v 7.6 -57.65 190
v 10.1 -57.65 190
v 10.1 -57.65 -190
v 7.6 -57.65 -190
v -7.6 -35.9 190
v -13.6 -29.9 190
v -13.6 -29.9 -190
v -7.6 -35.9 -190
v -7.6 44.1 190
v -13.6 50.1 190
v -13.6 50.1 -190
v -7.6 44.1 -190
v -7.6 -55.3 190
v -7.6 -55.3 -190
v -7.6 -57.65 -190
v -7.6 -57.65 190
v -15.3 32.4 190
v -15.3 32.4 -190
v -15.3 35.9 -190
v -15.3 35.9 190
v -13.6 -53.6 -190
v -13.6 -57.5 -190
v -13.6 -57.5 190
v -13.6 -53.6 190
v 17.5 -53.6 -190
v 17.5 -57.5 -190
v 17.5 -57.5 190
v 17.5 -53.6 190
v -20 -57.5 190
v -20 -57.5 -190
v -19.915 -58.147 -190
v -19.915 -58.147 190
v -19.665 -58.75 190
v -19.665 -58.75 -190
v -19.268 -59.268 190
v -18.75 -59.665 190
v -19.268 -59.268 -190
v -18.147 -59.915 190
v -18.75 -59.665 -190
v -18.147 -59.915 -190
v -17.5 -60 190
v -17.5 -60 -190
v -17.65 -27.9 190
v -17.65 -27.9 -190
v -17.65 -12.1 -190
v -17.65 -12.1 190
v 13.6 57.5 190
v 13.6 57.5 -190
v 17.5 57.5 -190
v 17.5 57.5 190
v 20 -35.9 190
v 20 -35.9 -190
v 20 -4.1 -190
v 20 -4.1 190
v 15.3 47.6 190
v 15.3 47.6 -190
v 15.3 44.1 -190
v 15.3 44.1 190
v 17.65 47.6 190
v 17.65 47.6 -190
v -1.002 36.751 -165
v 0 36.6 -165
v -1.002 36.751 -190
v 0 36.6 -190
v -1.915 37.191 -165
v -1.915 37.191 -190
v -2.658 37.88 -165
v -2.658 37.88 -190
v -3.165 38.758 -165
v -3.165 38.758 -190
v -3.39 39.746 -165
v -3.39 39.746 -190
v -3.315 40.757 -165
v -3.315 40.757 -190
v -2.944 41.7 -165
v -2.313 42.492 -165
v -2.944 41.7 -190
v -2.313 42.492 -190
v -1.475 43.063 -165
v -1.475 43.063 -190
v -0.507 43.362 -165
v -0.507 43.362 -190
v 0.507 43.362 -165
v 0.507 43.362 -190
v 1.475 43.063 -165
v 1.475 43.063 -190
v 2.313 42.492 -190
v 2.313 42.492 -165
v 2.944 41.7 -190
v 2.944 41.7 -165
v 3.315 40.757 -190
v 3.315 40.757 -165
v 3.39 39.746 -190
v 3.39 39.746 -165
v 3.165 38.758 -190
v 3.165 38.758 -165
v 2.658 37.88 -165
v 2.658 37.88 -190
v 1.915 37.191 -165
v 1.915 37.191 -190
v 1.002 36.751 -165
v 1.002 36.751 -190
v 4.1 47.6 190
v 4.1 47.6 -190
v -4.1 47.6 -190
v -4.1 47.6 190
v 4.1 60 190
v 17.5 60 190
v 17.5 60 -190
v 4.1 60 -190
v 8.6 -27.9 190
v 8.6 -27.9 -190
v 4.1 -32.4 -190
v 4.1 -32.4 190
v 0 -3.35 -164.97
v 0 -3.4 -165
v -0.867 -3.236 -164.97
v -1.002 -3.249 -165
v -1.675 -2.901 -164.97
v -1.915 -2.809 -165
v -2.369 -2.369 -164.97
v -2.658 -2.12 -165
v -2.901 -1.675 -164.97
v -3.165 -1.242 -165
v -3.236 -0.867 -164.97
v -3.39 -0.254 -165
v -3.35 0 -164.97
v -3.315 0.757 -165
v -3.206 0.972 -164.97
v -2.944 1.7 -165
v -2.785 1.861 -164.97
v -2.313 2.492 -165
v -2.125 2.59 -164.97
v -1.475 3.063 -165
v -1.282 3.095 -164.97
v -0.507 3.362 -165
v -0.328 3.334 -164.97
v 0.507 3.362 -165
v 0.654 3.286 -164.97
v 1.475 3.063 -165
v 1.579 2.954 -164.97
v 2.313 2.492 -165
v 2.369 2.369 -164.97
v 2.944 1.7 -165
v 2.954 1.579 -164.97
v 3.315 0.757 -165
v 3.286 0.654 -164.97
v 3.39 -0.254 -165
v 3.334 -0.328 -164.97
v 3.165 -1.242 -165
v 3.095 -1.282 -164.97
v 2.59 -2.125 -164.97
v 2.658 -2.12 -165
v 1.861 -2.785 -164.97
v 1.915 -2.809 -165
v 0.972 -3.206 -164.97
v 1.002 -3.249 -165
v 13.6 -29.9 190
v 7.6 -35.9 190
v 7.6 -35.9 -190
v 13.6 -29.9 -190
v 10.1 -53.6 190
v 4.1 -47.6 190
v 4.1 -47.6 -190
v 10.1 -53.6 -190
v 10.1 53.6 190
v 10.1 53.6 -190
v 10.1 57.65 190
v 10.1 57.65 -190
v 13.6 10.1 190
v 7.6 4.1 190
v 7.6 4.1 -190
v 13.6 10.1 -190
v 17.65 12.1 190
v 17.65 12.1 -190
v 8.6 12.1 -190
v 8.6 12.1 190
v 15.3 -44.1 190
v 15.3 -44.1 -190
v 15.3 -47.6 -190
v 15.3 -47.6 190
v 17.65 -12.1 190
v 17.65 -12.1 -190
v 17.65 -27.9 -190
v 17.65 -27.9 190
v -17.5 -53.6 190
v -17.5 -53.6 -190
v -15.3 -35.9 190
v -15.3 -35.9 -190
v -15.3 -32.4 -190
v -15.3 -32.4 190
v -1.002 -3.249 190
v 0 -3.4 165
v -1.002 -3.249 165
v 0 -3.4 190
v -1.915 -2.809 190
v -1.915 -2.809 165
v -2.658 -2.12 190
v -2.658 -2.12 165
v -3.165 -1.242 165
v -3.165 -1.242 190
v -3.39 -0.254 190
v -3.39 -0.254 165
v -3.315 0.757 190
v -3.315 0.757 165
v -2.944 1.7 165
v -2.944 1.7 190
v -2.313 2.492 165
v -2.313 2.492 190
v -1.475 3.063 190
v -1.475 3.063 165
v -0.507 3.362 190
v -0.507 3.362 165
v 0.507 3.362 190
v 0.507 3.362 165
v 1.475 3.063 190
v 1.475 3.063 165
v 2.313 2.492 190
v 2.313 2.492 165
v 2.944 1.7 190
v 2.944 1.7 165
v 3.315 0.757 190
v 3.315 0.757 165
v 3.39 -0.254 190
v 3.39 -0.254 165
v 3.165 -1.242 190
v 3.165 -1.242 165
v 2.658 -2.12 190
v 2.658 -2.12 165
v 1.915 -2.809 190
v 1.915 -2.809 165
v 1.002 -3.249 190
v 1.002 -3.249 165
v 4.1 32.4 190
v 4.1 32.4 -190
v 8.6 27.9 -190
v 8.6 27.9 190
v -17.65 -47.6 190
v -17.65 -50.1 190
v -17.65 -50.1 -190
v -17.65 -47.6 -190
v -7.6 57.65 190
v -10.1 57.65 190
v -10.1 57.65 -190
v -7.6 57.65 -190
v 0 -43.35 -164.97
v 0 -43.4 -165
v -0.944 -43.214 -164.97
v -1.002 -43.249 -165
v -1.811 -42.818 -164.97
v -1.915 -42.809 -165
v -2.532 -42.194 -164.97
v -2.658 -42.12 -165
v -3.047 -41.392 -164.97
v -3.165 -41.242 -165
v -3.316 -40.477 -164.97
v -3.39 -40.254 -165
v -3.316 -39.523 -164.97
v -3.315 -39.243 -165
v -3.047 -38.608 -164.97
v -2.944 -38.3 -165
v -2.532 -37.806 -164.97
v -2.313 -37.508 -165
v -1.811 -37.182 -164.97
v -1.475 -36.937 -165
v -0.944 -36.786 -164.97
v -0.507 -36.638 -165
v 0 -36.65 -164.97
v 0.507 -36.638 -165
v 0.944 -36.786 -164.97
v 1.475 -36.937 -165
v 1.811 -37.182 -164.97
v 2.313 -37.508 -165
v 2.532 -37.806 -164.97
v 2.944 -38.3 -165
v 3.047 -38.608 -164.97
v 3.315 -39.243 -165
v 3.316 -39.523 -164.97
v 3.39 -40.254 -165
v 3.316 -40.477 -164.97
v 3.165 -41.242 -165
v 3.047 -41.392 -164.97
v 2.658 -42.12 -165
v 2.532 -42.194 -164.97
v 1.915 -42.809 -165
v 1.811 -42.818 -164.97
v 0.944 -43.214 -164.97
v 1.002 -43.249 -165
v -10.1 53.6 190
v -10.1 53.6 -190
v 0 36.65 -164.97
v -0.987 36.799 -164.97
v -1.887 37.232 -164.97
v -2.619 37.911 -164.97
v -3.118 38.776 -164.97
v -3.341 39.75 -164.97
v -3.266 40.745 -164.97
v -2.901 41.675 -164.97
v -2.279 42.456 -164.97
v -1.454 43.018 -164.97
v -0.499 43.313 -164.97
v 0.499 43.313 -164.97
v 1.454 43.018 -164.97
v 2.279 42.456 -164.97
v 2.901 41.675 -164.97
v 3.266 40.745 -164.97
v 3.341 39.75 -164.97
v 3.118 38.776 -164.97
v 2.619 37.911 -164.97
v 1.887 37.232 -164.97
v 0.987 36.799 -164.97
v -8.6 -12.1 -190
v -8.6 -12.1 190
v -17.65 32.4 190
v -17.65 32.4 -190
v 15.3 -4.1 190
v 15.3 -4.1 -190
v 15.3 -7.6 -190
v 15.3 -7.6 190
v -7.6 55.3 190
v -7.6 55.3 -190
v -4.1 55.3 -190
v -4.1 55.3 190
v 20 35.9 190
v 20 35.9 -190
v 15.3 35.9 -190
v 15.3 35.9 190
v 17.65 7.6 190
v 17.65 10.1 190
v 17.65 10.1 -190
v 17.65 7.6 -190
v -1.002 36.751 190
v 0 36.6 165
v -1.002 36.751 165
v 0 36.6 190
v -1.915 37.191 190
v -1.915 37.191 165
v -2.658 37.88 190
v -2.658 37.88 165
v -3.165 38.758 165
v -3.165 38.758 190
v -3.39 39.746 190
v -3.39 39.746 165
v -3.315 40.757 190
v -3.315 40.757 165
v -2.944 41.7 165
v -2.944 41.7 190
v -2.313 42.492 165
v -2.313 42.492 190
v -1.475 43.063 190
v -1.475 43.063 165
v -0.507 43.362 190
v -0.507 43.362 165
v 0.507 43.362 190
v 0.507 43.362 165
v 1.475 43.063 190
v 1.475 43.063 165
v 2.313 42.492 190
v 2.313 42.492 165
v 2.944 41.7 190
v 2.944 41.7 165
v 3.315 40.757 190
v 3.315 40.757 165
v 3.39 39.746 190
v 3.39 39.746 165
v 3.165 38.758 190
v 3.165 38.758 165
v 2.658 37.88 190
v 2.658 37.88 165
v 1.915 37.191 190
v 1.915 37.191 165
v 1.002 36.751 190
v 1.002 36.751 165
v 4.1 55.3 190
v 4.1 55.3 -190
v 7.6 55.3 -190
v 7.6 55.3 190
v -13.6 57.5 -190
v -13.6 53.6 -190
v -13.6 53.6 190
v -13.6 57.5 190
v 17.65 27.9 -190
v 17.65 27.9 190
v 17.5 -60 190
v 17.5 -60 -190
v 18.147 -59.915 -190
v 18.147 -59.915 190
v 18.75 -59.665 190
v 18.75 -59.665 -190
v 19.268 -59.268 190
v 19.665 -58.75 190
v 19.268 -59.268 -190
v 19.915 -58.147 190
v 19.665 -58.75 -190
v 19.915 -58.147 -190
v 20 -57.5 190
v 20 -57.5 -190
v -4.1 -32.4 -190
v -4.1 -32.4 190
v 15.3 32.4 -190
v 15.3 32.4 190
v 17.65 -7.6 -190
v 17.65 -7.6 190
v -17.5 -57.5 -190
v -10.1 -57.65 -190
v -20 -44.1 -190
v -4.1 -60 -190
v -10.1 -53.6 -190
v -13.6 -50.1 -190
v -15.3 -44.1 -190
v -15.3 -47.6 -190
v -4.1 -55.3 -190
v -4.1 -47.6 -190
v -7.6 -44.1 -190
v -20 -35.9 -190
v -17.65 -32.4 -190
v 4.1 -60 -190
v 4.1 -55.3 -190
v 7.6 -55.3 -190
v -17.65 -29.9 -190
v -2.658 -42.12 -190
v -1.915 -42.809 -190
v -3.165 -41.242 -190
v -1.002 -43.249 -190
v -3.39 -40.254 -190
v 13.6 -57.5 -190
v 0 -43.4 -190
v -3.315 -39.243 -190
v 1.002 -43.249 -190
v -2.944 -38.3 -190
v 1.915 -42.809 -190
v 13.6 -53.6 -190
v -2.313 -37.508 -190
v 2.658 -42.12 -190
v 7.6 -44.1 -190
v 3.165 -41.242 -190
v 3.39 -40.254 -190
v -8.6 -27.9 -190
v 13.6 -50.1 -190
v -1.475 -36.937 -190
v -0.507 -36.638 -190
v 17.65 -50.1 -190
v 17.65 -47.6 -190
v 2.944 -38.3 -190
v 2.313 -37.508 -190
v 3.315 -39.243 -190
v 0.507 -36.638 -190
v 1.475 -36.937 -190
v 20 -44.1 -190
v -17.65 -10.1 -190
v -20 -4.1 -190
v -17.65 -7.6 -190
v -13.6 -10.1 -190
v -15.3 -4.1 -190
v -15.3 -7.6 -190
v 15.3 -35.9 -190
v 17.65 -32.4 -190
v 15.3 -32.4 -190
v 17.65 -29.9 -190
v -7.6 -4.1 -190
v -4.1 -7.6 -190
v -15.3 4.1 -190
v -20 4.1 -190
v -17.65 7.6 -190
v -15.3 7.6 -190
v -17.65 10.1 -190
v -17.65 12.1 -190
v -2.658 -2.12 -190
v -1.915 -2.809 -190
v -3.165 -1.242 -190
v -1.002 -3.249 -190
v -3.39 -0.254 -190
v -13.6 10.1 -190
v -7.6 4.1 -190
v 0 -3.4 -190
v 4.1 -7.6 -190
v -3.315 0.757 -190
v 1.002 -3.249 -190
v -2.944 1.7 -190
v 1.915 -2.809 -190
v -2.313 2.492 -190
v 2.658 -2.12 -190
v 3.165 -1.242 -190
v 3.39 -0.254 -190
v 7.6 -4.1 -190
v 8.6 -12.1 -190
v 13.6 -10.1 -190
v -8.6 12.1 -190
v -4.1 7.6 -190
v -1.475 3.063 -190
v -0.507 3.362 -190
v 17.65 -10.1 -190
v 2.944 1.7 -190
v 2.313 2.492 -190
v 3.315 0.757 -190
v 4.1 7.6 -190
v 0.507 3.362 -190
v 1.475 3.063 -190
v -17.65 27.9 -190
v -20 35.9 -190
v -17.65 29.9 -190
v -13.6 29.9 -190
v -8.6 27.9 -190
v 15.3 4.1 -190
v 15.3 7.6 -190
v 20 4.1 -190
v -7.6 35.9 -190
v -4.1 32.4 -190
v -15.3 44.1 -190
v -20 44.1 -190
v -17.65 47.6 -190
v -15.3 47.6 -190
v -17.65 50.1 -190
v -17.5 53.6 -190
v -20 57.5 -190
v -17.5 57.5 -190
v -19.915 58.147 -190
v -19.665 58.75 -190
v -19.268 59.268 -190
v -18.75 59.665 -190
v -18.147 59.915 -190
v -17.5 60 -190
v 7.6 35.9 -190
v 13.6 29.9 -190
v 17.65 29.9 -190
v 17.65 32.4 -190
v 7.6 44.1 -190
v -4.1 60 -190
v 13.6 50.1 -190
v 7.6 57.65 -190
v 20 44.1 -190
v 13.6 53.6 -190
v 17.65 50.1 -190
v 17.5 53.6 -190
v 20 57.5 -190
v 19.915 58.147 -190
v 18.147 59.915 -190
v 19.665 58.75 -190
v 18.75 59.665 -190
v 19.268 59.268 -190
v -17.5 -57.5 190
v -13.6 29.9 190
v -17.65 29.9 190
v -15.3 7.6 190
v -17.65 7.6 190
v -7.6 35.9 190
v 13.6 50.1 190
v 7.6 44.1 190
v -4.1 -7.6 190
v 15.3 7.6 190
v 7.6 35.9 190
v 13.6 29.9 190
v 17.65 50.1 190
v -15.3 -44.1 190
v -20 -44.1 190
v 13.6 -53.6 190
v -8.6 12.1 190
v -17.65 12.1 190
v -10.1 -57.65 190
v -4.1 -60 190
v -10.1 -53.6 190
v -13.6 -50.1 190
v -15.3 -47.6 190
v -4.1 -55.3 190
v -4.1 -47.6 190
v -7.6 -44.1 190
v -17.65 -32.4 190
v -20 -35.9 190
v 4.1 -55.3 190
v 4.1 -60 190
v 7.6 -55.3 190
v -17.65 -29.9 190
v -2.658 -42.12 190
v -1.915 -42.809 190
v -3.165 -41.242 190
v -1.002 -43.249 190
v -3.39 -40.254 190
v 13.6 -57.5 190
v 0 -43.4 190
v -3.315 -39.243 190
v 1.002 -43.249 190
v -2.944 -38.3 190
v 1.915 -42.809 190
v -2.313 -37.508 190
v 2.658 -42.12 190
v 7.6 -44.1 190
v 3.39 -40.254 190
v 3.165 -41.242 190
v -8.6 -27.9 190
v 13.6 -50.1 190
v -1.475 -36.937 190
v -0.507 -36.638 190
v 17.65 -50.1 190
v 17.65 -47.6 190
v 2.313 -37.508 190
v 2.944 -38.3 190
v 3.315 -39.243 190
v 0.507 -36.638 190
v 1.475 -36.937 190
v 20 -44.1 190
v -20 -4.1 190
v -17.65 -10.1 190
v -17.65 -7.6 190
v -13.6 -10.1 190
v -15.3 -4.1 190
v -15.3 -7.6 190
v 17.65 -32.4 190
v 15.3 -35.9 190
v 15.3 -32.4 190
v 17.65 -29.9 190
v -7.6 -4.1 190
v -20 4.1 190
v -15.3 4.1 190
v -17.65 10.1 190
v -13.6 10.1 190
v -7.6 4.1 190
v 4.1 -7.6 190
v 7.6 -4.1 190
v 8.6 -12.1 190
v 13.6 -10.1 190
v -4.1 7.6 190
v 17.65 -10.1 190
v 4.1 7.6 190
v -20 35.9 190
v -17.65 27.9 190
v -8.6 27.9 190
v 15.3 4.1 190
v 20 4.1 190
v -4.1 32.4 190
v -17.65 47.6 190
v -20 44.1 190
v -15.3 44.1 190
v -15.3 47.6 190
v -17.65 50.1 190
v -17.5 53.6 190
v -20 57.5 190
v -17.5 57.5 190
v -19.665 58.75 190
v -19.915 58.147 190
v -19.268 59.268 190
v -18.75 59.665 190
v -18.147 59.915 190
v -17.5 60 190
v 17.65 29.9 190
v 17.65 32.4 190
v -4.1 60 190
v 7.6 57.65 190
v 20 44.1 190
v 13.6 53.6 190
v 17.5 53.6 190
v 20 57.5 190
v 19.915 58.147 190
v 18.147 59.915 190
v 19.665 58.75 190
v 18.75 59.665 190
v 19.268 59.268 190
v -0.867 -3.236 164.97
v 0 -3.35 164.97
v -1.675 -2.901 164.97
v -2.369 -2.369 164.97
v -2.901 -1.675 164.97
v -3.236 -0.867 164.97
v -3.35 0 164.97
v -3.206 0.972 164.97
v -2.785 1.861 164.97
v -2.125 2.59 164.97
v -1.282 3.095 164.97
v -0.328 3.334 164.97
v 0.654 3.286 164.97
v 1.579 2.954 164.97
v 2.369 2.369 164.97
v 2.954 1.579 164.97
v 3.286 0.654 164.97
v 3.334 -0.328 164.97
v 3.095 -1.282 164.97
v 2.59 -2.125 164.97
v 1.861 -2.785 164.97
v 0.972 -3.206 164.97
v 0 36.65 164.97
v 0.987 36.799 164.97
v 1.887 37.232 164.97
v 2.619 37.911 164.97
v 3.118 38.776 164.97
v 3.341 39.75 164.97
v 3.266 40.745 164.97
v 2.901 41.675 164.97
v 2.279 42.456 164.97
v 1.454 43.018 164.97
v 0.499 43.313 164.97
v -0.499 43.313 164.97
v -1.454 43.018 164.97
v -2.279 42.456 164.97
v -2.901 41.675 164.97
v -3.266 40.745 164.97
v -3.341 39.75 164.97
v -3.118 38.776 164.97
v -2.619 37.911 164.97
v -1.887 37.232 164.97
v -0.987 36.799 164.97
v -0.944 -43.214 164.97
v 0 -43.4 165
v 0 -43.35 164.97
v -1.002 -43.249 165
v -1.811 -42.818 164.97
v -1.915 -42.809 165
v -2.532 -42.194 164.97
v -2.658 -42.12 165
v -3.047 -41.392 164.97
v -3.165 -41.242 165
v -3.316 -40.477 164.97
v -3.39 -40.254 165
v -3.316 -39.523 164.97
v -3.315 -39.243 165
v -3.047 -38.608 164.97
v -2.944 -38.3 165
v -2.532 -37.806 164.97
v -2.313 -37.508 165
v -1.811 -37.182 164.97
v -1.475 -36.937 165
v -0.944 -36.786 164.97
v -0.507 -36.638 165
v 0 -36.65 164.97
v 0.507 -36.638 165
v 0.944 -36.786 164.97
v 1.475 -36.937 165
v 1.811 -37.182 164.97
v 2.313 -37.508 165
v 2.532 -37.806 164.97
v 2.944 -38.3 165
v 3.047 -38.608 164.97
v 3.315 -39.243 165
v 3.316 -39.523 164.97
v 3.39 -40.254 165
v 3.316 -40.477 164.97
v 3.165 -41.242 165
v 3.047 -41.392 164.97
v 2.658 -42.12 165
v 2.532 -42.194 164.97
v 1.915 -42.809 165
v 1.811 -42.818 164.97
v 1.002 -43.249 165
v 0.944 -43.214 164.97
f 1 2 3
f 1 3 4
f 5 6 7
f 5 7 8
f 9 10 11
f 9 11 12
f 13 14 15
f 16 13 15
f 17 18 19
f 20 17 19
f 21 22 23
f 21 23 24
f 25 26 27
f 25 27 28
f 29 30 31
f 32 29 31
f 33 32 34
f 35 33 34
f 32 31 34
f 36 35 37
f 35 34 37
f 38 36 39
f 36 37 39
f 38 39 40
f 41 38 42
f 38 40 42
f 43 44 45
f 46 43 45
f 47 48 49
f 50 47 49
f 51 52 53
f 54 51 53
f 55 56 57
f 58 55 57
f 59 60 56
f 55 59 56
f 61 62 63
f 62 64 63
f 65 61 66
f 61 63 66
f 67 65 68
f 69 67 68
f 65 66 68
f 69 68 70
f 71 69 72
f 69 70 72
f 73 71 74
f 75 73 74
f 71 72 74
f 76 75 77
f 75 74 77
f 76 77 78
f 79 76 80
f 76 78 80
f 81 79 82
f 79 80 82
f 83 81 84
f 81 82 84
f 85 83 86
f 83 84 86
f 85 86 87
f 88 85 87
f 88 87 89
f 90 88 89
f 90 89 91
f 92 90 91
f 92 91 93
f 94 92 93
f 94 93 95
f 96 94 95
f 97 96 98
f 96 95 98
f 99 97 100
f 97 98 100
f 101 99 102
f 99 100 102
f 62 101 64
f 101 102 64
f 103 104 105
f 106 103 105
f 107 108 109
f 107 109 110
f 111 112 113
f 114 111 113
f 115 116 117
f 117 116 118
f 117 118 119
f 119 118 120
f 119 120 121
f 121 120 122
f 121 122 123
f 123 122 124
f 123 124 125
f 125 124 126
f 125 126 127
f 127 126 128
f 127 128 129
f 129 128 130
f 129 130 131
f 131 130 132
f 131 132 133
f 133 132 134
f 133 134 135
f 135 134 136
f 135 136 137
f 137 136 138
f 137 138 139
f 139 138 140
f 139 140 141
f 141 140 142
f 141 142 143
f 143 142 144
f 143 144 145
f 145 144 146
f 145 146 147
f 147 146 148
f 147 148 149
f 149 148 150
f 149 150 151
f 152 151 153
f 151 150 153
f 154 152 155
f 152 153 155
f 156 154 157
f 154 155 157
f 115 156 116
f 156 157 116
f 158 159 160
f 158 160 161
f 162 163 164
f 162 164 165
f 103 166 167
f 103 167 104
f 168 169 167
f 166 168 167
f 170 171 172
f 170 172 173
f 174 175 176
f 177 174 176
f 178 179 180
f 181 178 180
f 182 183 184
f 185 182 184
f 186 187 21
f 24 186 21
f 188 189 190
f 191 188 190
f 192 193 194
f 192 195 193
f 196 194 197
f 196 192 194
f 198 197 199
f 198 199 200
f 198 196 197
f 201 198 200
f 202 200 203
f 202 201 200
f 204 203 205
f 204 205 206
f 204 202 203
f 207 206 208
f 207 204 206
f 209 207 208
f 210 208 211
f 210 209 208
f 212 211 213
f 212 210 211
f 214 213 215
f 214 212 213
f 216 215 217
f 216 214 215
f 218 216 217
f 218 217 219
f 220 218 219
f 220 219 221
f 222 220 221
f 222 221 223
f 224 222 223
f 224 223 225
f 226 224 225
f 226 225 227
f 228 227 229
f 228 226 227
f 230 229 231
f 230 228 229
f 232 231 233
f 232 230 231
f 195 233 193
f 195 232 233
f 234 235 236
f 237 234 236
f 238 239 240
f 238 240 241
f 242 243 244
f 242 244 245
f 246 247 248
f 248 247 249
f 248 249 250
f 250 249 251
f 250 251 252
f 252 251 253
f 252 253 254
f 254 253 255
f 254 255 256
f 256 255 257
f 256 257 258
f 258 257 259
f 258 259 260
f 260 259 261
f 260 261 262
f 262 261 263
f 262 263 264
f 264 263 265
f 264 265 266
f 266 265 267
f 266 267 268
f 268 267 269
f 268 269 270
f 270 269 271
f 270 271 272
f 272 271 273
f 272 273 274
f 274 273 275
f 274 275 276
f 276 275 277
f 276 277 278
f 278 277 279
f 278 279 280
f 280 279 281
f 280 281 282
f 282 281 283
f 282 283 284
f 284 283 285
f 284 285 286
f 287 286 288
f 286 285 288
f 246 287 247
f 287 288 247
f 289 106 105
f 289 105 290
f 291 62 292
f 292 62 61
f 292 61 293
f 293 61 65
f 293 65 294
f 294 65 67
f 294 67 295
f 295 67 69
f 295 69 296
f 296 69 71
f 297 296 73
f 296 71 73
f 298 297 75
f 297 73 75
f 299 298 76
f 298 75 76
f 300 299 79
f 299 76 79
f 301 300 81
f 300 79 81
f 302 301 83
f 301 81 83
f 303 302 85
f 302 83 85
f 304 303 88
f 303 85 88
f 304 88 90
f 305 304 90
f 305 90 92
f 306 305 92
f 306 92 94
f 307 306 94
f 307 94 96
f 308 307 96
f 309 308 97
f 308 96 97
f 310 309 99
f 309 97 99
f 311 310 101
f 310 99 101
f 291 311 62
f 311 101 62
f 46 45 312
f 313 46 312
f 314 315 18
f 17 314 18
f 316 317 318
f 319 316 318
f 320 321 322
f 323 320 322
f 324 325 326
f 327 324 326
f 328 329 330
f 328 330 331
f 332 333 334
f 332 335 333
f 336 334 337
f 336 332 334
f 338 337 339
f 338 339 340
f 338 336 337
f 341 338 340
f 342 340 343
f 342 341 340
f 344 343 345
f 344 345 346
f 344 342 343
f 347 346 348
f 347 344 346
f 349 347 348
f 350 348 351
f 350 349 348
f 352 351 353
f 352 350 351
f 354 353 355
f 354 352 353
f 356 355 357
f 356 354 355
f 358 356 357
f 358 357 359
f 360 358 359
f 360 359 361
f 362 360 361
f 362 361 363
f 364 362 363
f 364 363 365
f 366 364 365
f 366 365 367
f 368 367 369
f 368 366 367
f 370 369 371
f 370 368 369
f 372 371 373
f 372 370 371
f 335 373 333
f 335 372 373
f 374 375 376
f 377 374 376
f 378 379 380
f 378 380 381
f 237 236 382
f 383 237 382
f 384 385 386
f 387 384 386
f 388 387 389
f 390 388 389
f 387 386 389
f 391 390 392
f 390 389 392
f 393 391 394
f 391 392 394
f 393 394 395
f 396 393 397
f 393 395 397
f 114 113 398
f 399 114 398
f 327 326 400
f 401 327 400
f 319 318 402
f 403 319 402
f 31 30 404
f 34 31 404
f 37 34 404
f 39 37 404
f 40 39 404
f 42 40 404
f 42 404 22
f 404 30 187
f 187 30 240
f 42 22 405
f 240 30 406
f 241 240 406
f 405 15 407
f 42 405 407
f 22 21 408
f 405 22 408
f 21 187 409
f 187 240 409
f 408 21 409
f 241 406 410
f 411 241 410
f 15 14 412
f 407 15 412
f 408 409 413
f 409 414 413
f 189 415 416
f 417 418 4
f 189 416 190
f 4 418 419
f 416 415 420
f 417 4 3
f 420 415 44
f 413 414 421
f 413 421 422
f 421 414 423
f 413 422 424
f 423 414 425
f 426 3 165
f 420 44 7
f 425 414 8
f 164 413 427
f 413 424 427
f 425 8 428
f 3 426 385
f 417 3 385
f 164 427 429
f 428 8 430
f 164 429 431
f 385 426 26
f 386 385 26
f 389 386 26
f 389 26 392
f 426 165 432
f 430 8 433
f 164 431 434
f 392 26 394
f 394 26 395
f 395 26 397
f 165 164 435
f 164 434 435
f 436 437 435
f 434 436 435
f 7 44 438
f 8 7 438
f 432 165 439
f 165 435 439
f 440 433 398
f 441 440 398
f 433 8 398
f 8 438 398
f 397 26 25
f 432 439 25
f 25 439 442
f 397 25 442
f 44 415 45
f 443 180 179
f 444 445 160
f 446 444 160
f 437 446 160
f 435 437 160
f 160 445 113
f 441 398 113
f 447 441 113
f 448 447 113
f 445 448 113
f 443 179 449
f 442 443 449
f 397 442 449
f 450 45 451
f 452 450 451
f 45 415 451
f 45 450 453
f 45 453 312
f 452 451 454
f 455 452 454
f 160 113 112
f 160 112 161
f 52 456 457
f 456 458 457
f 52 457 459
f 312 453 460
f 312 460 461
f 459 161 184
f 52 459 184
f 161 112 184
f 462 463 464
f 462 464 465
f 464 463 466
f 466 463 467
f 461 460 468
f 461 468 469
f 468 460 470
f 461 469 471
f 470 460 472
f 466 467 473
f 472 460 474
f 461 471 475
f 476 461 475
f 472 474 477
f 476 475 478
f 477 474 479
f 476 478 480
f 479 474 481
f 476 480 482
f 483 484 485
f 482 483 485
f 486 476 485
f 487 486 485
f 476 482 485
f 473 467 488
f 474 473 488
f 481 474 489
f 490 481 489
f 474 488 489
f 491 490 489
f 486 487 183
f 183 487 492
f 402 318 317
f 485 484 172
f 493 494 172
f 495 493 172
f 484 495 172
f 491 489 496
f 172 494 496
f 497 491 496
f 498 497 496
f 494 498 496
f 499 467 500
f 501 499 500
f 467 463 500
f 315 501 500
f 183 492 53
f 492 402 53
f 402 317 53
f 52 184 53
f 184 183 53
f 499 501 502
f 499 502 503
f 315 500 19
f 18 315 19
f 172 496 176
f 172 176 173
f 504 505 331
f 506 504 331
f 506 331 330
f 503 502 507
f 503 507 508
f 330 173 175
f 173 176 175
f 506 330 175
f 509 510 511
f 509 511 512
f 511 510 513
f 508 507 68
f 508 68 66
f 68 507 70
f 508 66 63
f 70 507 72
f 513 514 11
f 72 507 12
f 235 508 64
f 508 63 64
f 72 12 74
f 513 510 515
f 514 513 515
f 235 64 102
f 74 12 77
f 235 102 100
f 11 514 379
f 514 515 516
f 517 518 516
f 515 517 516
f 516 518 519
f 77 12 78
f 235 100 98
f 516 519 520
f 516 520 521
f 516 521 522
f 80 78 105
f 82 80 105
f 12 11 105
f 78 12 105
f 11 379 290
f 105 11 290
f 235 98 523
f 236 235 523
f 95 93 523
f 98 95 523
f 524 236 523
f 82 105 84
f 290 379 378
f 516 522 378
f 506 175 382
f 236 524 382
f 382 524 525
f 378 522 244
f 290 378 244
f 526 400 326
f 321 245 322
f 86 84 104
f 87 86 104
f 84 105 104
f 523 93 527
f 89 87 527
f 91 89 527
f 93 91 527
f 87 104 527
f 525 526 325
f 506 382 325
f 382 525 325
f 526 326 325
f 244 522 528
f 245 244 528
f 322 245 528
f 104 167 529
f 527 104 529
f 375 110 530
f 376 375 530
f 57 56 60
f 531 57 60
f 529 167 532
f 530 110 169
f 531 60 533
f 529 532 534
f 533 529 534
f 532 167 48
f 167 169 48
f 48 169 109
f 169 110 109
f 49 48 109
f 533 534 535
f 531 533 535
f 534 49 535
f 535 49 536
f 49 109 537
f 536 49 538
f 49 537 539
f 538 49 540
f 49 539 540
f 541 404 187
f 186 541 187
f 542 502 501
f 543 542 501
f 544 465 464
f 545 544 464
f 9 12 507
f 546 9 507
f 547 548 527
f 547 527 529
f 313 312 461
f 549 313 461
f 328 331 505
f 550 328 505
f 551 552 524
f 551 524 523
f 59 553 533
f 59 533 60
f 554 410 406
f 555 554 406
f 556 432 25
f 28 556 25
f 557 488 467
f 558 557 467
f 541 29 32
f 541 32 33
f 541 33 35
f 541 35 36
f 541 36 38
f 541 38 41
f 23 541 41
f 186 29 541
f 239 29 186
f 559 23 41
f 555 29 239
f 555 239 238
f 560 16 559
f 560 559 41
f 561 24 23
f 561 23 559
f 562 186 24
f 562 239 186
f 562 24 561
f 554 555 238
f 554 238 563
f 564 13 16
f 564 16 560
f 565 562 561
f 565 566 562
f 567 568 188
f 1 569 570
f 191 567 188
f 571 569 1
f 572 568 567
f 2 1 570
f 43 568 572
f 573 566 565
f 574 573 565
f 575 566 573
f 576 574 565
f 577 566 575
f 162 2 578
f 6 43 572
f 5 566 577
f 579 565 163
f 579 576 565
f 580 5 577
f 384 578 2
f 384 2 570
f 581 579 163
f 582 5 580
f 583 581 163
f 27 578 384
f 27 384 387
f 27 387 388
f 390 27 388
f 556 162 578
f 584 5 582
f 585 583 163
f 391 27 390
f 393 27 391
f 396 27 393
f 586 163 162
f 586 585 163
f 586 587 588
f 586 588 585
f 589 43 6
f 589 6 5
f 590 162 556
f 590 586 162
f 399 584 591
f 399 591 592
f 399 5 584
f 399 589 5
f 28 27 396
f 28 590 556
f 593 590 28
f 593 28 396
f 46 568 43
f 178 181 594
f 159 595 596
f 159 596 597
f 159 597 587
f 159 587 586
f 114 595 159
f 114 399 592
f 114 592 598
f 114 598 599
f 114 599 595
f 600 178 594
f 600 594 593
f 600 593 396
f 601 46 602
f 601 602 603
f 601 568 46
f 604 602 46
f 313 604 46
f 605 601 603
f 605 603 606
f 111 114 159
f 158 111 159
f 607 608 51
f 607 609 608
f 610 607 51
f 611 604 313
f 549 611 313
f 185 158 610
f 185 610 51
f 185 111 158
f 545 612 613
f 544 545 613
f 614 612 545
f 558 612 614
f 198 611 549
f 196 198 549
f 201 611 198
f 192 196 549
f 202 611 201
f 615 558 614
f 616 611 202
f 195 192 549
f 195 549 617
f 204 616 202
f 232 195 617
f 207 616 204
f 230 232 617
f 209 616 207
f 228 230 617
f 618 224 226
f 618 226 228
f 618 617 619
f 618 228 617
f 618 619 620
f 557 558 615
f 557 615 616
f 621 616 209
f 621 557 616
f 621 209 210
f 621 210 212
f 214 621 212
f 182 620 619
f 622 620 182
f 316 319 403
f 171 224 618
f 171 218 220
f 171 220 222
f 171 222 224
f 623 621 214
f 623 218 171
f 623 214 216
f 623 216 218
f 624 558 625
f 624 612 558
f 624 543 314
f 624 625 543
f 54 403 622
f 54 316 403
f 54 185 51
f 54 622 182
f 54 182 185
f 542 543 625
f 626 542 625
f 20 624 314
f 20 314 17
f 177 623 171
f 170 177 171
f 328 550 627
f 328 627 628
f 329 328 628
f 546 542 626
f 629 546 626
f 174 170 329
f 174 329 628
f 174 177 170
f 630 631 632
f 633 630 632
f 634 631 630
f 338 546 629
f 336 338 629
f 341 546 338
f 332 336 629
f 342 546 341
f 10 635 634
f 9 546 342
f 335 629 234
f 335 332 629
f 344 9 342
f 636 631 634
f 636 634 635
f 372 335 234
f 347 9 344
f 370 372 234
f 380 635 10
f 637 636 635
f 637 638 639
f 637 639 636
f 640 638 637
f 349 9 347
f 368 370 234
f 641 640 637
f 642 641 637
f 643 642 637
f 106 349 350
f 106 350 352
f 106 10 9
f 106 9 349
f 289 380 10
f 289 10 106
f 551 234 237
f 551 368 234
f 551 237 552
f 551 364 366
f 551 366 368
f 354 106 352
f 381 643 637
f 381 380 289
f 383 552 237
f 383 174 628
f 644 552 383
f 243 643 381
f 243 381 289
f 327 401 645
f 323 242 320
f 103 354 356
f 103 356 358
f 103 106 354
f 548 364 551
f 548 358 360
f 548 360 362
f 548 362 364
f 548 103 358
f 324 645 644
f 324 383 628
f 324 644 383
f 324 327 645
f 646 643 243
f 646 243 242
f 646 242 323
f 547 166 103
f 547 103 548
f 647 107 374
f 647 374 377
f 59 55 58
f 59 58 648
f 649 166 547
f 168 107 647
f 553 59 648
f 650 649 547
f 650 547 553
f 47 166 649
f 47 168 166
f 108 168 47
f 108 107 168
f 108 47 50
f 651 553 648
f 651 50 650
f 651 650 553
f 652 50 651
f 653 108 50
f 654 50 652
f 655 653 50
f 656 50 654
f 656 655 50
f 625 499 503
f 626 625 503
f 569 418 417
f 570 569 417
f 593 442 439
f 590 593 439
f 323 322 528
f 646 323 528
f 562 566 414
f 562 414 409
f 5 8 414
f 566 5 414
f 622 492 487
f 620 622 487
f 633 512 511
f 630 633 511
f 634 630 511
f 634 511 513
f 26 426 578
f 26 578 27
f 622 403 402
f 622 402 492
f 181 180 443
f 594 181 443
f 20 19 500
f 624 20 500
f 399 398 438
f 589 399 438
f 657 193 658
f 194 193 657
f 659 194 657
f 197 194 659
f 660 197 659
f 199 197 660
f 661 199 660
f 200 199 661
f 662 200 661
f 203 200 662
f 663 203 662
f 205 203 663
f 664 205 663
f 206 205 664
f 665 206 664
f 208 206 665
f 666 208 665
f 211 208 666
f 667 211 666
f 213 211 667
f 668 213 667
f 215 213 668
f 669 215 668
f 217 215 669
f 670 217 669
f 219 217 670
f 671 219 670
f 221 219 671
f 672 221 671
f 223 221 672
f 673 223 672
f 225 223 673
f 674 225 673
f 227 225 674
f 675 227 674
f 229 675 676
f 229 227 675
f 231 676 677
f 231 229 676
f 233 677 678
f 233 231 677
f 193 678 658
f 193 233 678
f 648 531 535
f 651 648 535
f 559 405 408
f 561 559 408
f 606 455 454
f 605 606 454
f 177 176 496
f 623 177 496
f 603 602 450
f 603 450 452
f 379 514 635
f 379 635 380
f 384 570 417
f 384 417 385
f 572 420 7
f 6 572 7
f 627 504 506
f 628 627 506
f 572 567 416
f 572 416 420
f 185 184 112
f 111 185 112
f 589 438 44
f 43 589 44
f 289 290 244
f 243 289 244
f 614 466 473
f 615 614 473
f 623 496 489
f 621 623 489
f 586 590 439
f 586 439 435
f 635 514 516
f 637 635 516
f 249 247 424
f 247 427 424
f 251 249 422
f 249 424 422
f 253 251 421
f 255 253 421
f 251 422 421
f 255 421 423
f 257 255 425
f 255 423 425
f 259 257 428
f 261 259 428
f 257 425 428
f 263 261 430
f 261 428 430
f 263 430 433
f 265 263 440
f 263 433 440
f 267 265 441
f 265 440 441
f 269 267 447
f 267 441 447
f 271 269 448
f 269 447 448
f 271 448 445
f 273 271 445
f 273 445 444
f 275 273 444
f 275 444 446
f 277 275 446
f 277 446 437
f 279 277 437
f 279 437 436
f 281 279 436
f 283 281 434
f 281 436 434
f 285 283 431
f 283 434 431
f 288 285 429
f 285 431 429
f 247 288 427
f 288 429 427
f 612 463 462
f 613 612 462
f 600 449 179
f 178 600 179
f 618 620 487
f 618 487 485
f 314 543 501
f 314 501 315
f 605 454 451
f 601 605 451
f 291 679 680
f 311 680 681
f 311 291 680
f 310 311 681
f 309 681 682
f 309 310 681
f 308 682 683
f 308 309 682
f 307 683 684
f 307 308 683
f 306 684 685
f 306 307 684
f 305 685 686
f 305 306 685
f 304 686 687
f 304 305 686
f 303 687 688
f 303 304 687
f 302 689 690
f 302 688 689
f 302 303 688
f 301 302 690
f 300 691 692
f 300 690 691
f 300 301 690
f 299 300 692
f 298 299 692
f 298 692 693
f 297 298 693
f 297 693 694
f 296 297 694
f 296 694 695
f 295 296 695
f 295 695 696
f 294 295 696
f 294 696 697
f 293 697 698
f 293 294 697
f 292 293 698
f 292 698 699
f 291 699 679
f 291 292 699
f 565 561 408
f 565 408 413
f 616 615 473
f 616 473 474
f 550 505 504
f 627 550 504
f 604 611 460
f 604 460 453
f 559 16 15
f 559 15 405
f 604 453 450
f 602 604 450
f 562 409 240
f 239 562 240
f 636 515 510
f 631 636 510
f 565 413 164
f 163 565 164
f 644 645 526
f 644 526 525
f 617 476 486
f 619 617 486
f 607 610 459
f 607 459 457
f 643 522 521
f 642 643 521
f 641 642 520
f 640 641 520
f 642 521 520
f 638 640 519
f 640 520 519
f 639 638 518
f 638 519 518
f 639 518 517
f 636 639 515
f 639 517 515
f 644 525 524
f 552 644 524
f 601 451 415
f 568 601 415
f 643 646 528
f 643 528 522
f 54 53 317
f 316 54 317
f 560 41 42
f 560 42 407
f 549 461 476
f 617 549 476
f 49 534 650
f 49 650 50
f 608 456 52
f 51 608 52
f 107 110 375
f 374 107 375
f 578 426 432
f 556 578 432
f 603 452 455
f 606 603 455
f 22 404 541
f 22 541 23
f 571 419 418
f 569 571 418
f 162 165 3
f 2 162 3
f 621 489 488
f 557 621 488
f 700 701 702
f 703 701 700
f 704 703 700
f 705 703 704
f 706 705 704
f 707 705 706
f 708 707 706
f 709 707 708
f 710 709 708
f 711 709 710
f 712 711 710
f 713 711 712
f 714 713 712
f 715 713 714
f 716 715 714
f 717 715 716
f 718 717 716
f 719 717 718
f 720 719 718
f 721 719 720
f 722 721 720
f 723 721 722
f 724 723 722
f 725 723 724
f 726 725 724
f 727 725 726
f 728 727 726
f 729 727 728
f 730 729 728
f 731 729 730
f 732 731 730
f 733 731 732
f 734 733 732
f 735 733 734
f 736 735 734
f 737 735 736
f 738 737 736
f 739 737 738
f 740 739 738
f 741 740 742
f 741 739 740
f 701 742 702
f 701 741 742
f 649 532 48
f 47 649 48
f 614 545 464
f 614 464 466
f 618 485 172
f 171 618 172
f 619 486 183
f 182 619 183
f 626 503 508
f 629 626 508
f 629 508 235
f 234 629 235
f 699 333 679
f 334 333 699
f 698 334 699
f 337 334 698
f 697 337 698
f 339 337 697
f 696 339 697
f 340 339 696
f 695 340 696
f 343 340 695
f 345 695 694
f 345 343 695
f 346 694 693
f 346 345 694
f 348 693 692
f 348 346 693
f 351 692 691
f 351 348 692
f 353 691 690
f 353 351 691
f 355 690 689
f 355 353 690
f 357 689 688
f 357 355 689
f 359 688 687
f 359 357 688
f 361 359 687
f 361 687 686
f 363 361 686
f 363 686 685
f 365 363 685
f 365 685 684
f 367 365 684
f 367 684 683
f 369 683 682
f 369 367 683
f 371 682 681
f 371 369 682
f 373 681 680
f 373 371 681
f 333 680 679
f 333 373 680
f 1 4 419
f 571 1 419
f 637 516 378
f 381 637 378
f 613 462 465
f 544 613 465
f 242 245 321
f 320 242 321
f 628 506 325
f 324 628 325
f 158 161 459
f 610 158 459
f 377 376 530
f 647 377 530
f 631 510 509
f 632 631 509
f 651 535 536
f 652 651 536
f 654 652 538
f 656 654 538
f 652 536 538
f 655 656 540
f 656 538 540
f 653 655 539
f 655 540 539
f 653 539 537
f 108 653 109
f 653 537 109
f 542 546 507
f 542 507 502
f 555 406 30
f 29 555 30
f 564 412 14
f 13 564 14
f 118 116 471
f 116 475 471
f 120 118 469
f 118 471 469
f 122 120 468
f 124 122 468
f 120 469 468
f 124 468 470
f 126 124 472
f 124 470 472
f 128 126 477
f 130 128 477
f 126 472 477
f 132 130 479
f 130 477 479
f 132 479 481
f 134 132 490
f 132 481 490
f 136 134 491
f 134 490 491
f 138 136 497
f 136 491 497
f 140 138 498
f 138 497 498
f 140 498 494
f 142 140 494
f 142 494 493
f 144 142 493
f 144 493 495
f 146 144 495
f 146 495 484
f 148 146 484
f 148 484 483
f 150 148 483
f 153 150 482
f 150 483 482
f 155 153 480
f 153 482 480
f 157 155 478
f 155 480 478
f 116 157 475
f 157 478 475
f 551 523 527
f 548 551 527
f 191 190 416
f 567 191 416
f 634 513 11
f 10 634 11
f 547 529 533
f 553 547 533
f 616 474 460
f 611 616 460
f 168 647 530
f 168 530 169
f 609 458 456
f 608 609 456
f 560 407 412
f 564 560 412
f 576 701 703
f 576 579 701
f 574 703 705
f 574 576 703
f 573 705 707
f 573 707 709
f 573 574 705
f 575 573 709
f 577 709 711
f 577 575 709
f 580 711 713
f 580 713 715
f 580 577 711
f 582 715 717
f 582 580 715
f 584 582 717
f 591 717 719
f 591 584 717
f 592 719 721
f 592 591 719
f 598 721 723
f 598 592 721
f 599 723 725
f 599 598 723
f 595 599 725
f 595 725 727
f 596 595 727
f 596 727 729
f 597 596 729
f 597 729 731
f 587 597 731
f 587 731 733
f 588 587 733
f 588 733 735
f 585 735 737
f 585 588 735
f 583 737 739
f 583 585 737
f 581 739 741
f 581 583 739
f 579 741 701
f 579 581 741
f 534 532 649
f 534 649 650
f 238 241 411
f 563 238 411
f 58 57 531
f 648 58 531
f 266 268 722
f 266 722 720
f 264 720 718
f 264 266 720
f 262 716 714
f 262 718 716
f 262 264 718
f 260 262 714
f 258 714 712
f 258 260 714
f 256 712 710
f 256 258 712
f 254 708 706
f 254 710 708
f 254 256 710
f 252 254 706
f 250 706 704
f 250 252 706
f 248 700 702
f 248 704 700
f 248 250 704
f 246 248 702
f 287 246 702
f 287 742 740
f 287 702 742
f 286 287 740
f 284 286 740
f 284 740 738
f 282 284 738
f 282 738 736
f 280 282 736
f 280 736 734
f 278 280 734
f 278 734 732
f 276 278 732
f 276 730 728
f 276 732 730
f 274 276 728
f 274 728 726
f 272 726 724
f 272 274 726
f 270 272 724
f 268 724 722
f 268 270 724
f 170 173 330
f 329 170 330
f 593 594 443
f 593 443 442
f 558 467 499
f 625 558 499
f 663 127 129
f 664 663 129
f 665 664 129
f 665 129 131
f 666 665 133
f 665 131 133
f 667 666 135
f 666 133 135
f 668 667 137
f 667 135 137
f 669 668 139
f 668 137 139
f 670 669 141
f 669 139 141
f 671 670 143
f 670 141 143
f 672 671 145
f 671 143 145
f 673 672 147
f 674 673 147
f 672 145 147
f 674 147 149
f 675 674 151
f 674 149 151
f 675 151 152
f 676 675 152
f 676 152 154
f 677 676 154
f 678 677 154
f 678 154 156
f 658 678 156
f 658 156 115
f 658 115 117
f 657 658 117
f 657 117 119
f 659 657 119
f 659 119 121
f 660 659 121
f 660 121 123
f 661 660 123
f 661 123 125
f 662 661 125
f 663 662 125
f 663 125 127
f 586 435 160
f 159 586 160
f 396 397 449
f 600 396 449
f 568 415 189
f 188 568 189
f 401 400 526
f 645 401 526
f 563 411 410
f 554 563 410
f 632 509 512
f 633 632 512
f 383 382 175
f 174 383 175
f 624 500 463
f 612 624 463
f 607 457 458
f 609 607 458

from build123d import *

# Parameters (mm, degrees)
SKETCH2_W                       = 3.9
SKETCH2_H                       = 3.9
F_40_SERIES_TS40_120LM_1_DEPTH  = 380
M8X1_25_TAPPED_HOLE1_AT_2_COUNT = 2
M8X1_25_TAPPED_HOLE1_AT_2_PITCH = 40
M8X1_25_TAPPED_HOLE1_AT_3_COUNT = 2
M8X1_25_TAPPED_HOLE1_AT_3_PITCH = 80


with BuildPart() as part:
    # Sketch2 → 40 series TS40-120LM(1) (new body)
    with BuildSketch(Plane.XY.offset(-190)):
        with BuildLine():
            Line((15.3, -35.9), (20, -35.9))
            Line((20, -35.9), (20, -4.1))
            Line((20, -4.1), (15.3, -4.1))
            Line((15.3, -4.1), (15.3, -7.6))
            Line((15.3, -7.6), (17.65, -7.6))
            Line((17.65, -7.6), (17.65, -10.1))
            Line((17.65, -10.1), (13.6, -10.1))
            Line((13.6, -10.1), (7.6, -4.1))
            Line((7.6, -4.1), (7.6, 4.1))
            Line((7.6, 4.1), (13.6, 10.1))
            Line((13.6, 10.1), (17.65, 10.1))
            Line((17.65, 10.1), (17.65, 7.6))
            Line((17.65, 7.6), (15.3, 7.6))
            Line((15.3, 7.6), (15.3, 4.1))
            Line((15.3, 4.1), (20, 4.1))
            Line((20, 4.1), (20, 35.9))
            Line((20, 35.9), (15.3, 35.9))
            Line((15.3, 35.9), (15.3, 32.4))
            Line((15.3, 32.4), (17.65, 32.4))
            Line((17.65, 32.4), (17.65, 29.9))
            Line((17.65, 29.9), (13.6, 29.9))
            Line((13.6, 29.9), (7.6, 35.9))
            Line((7.6, 35.9), (7.6, 44.1))
            Line((7.6, 44.1), (13.6, 50.1))
            Line((13.6, 50.1), (17.65, 50.1))
            Line((17.65, 50.1), (17.65, 47.6))
            Line((17.65, 47.6), (15.3, 47.6))
            Line((15.3, 47.6), (15.3, 44.1))
            Line((15.3, 44.1), (20, 44.1))
            Line((20, 44.1), (20, 57.5))
            ThreePointArc((20, 57.5), (19.267766953, 59.267766953), (17.5, 60))
            Line((17.5, 60), (4.1, 60))
            Line((4.1, 60), (4.1, 55.3))
            Line((4.1, 55.3), (7.6, 55.3))
            Line((7.6, 55.3), (7.6, 57.65))
            Line((7.6, 57.65), (10.1, 57.65))
            Line((10.1, 57.65), (10.1, 53.6))
            Line((10.1, 53.6), (4.1, 47.6))
            Line((4.1, 47.6), (-4.1, 47.6))
            Line((-4.1, 47.6), (-10.1, 53.6))
            Line((-10.1, 53.6), (-10.1, 57.65))
            Line((-10.1, 57.65), (-7.6, 57.65))
            Line((-7.6, 57.65), (-7.6, 55.3))
            Line((-7.6, 55.3), (-4.1, 55.3))
            Line((-4.1, 55.3), (-4.1, 60))
            Line((-4.1, 60), (-17.5, 60))
            ThreePointArc((-17.5, 60), (-19.267766953, 59.267766953), (-20, 57.5))
            Line((-20, 57.5), (-20, 44.1))
            Line((-20, 44.1), (-15.3, 44.1))
            Line((-15.3, 44.1), (-15.3, 47.6))
            Line((-15.3, 47.6), (-17.65, 47.6))
            Line((-17.65, 47.6), (-17.65, 50.1))
            Line((-17.65, 50.1), (-13.6, 50.1))
            Line((-13.6, 50.1), (-7.6, 44.1))
            Line((-7.6, 44.1), (-7.6, 35.9))
            Line((-7.6, 35.9), (-13.6, 29.9))
            Line((-13.6, 29.9), (-17.65, 29.9))
            Line((-17.65, 29.9), (-17.65, 32.4))
            Line((-17.65, 32.4), (-15.3, 32.4))
            Line((-15.3, 32.4), (-15.3, 35.9))
            Line((-15.3, 35.9), (-20, 35.9))
            Line((-20, 35.9), (-20, 4.1))
            Line((-20, 4.1), (-15.3, 4.1))
            Line((-15.3, 4.1), (-15.3, 7.6))
            Line((-15.3, 7.6), (-17.65, 7.6))
            Line((-17.65, 7.6), (-17.65, 10.1))
            Line((-17.65, 10.1), (-13.6, 10.1))
            Line((-13.6, 10.1), (-7.6, 4.1))
            Line((-7.6, 4.1), (-7.6, -4.1))
            Line((-7.6, -4.1), (-13.6, -10.1))
            Line((-13.6, -10.1), (-17.65, -10.1))
            Line((-17.65, -10.1), (-17.65, -7.6))
            Line((-17.65, -7.6), (-15.3, -7.6))
            Line((-15.3, -7.6), (-15.3, -4.1))
            Line((-15.3, -4.1), (-20, -4.1))
            Line((-20, -4.1), (-20, -35.9))
            Line((-20, -35.9), (-15.3, -35.9))
            Line((-15.3, -35.9), (-15.3, -32.4))
            Line((-15.3, -32.4), (-17.65, -32.4))
            Line((-17.65, -32.4), (-17.65, -29.9))
            Line((-17.65, -29.9), (-13.6, -29.9))
            Line((-13.6, -29.9), (-7.6, -35.9))
            Line((-7.6, -35.9), (-7.6, -44.1))
            Line((-7.6, -44.1), (-13.6, -50.1))
            Line((-13.6, -50.1), (-17.65, -50.1))
            Line((-17.65, -50.1), (-17.65, -47.6))
            Line((-17.65, -47.6), (-15.3, -47.6))
            Line((-15.3, -47.6), (-15.3, -44.1))
            Line((-15.3, -44.1), (-20, -44.1))
            Line((-20, -44.1), (-20, -57.5))
            ThreePointArc((-20, -57.5), (-19.267766953, -59.267766953), (-17.5, -60))
            Line((-17.5, -60), (-4.1, -60))
            Line((-4.1, -60), (-4.1, -55.3))
            Line((-4.1, -55.3), (-7.6, -55.3))
            Line((-7.6, -55.3), (-7.6, -57.65))
            Line((-7.6, -57.65), (-10.1, -57.65))
            Line((-10.1, -57.65), (-10.1, -53.6))
            Line((-10.1, -53.6), (-4.1, -47.6))
            Line((-4.1, -47.6), (4.1, -47.6))
            Line((4.1, -47.6), (10.1, -53.6))
            Line((10.1, -53.6), (10.1, -57.65))
            Line((10.1, -57.65), (7.6, -57.65))
            Line((7.6, -57.65), (7.6, -55.3))
            Line((7.6, -55.3), (4.1, -55.3))
            Line((4.1, -55.3), (4.1, -60))
            Line((4.1, -60), (17.5, -60))
            ThreePointArc((17.5, -60), (19.267766953, -59.267766953), (20, -57.5))
            Line((20, -57.5), (20, -44.1))
            Line((20, -44.1), (15.3, -44.1))
            Line((15.3, -44.1), (15.3, -47.6))
            Line((15.3, -47.6), (17.65, -47.6))
            Line((17.65, -47.6), (17.65, -50.1))
            Line((17.65, -50.1), (13.6, -50.1))
            Line((13.6, -50.1), (7.6, -44.1))
            Line((7.6, -44.1), (7.6, -35.9))
            Line((7.6, -35.9), (13.6, -29.9))
            Line((13.6, -29.9), (17.65, -29.9))
            Line((17.65, -29.9), (17.65, -32.4))
            Line((17.65, -32.4), (15.3, -32.4))
            Line((15.3, -32.4), (15.3, -35.9))
        make_face()
        Polygon((-4.1, -7.6), (4.1, -7.6), (8.6, -12.1), (17.65, -12.1), (17.65, -27.9), (8.6, -27.9), (4.1, -32.4), (-4.1, -32.4), (-8.6, -27.9), (-17.65, -27.9), (-17.65, -12.1), (-8.6, -12.1), align=None, mode=Mode.SUBTRACT)
        Polygon((-4.1, 7.6), (-8.6, 12.1), (-17.65, 12.1), (-17.65, 27.9), (-8.6, 27.9), (-4.1, 32.4), (4.1, 32.4), (8.6, 27.9), (17.65, 27.9), (17.65, 12.1), (8.6, 12.1), (4.1, 7.6), align=None, mode=Mode.SUBTRACT)
        with Locations((15.55, -55.55)):
            Rectangle(SKETCH2_W, SKETCH2_H, mode=Mode.SUBTRACT)
        with Locations((-15.55, -55.55)):
            Rectangle(SKETCH2_W, SKETCH2_H, mode=Mode.SUBTRACT)
        with Locations((-15.55, 55.55)):
            Rectangle(SKETCH2_W, SKETCH2_H, mode=Mode.SUBTRACT)
        with Locations((15.55, 55.55)):
            Rectangle(SKETCH2_W, SKETCH2_H, mode=Mode.SUBTRACT)
        with BuildLine():
            ThreePointArc((0, -43.35), (3.35, -40), (0, -36.65))
            ThreePointArc((0, -36.65), (-3.35, -40), (0, -43.35))
        make_face(mode=Mode.SUBTRACT)
        with BuildLine():
            ThreePointArc((3.35, 0), (0, -3.35), (-3.35, 0))
            ThreePointArc((-3.35, 0), (0, 3.35), (3.35, 0))
        make_face(mode=Mode.SUBTRACT)
        with BuildLine():
            ThreePointArc((0, 43.35), (-3.35, 40), (0, 36.65))
            ThreePointArc((0, 36.65), (3.35, 40), (0, 43.35))
        make_face(mode=Mode.SUBTRACT)
    extrude(amount=F_40_SERIES_TS40_120LM_1_DEPTH)

    # Sketch4 → M8x1.25 Tapped Hole1 (revolve, cut)
    with BuildSketch(Plane(origin=(0, 40, 190), x_dir=(0, -1, 0), z_dir=(1, 0, 0))):
        Polygon((0, 0), (0, 27.042926105), (3.4, 25), (3.4, 0), align=None)
    m8x1_25_tapped_hole1 = revolve(axis=Axis((0, 40, 196.35), (0, 0, -1)), mode=Mode.SUBTRACT)

    # M8x1.25 Tapped Hole1 at 2: M8x1.25 Tapped Hole1 ×2
    with Locations(*[(0, -i * M8X1_25_TAPPED_HOLE1_AT_2_PITCH, 0) for i in range(1, M8X1_25_TAPPED_HOLE1_AT_2_COUNT)]):
        add(m8x1_25_tapped_hole1, mode=Mode.SUBTRACT)

    # M8x1.25 Tapped Hole1 at 3: M8x1.25 Tapped Hole1 ×2
    with Locations(*[(0, -i * M8X1_25_TAPPED_HOLE1_AT_3_PITCH, 0) for i in range(1, M8X1_25_TAPPED_HOLE1_AT_3_COUNT)]):
        add(m8x1_25_tapped_hole1, mode=Mode.SUBTRACT)

    # Mirror1: M8x1.25 Tapped Hole1 across plane
    add(m8x1_25_tapped_hole1.mirror(Plane.XY), mode=Mode.SUBTRACT)

    # Mirror1 copy 1 sketch → Mirror1 copy 1 (revolve, cut)
    with BuildSketch(Plane(origin=(0, 0, -190), x_dir=(0, -1, 0), z_dir=(1, 0, 0))):
        Polygon((0, 0), (0, -27.042926105), (3.4, -25), (3.4, 0), align=None)
    revolve(axis=Axis((0, 0, -196.35), (0, 0, -1)), mode=Mode.SUBTRACT)

    # Mirror1 copy 2 sketch → Mirror1 copy 2 (revolve, cut)
    with BuildSketch(Plane(origin=(0, -40, -190), x_dir=(0, -1, 0), z_dir=(1, 0, 0))):
        Polygon((0, 0), (0, -27.042926105), (3.4, -25), (3.4, 0), align=None)
    revolve(axis=Axis((0, -40, -196.35), (0, 0, -1)), mode=Mode.SUBTRACT)


solid = part.part
